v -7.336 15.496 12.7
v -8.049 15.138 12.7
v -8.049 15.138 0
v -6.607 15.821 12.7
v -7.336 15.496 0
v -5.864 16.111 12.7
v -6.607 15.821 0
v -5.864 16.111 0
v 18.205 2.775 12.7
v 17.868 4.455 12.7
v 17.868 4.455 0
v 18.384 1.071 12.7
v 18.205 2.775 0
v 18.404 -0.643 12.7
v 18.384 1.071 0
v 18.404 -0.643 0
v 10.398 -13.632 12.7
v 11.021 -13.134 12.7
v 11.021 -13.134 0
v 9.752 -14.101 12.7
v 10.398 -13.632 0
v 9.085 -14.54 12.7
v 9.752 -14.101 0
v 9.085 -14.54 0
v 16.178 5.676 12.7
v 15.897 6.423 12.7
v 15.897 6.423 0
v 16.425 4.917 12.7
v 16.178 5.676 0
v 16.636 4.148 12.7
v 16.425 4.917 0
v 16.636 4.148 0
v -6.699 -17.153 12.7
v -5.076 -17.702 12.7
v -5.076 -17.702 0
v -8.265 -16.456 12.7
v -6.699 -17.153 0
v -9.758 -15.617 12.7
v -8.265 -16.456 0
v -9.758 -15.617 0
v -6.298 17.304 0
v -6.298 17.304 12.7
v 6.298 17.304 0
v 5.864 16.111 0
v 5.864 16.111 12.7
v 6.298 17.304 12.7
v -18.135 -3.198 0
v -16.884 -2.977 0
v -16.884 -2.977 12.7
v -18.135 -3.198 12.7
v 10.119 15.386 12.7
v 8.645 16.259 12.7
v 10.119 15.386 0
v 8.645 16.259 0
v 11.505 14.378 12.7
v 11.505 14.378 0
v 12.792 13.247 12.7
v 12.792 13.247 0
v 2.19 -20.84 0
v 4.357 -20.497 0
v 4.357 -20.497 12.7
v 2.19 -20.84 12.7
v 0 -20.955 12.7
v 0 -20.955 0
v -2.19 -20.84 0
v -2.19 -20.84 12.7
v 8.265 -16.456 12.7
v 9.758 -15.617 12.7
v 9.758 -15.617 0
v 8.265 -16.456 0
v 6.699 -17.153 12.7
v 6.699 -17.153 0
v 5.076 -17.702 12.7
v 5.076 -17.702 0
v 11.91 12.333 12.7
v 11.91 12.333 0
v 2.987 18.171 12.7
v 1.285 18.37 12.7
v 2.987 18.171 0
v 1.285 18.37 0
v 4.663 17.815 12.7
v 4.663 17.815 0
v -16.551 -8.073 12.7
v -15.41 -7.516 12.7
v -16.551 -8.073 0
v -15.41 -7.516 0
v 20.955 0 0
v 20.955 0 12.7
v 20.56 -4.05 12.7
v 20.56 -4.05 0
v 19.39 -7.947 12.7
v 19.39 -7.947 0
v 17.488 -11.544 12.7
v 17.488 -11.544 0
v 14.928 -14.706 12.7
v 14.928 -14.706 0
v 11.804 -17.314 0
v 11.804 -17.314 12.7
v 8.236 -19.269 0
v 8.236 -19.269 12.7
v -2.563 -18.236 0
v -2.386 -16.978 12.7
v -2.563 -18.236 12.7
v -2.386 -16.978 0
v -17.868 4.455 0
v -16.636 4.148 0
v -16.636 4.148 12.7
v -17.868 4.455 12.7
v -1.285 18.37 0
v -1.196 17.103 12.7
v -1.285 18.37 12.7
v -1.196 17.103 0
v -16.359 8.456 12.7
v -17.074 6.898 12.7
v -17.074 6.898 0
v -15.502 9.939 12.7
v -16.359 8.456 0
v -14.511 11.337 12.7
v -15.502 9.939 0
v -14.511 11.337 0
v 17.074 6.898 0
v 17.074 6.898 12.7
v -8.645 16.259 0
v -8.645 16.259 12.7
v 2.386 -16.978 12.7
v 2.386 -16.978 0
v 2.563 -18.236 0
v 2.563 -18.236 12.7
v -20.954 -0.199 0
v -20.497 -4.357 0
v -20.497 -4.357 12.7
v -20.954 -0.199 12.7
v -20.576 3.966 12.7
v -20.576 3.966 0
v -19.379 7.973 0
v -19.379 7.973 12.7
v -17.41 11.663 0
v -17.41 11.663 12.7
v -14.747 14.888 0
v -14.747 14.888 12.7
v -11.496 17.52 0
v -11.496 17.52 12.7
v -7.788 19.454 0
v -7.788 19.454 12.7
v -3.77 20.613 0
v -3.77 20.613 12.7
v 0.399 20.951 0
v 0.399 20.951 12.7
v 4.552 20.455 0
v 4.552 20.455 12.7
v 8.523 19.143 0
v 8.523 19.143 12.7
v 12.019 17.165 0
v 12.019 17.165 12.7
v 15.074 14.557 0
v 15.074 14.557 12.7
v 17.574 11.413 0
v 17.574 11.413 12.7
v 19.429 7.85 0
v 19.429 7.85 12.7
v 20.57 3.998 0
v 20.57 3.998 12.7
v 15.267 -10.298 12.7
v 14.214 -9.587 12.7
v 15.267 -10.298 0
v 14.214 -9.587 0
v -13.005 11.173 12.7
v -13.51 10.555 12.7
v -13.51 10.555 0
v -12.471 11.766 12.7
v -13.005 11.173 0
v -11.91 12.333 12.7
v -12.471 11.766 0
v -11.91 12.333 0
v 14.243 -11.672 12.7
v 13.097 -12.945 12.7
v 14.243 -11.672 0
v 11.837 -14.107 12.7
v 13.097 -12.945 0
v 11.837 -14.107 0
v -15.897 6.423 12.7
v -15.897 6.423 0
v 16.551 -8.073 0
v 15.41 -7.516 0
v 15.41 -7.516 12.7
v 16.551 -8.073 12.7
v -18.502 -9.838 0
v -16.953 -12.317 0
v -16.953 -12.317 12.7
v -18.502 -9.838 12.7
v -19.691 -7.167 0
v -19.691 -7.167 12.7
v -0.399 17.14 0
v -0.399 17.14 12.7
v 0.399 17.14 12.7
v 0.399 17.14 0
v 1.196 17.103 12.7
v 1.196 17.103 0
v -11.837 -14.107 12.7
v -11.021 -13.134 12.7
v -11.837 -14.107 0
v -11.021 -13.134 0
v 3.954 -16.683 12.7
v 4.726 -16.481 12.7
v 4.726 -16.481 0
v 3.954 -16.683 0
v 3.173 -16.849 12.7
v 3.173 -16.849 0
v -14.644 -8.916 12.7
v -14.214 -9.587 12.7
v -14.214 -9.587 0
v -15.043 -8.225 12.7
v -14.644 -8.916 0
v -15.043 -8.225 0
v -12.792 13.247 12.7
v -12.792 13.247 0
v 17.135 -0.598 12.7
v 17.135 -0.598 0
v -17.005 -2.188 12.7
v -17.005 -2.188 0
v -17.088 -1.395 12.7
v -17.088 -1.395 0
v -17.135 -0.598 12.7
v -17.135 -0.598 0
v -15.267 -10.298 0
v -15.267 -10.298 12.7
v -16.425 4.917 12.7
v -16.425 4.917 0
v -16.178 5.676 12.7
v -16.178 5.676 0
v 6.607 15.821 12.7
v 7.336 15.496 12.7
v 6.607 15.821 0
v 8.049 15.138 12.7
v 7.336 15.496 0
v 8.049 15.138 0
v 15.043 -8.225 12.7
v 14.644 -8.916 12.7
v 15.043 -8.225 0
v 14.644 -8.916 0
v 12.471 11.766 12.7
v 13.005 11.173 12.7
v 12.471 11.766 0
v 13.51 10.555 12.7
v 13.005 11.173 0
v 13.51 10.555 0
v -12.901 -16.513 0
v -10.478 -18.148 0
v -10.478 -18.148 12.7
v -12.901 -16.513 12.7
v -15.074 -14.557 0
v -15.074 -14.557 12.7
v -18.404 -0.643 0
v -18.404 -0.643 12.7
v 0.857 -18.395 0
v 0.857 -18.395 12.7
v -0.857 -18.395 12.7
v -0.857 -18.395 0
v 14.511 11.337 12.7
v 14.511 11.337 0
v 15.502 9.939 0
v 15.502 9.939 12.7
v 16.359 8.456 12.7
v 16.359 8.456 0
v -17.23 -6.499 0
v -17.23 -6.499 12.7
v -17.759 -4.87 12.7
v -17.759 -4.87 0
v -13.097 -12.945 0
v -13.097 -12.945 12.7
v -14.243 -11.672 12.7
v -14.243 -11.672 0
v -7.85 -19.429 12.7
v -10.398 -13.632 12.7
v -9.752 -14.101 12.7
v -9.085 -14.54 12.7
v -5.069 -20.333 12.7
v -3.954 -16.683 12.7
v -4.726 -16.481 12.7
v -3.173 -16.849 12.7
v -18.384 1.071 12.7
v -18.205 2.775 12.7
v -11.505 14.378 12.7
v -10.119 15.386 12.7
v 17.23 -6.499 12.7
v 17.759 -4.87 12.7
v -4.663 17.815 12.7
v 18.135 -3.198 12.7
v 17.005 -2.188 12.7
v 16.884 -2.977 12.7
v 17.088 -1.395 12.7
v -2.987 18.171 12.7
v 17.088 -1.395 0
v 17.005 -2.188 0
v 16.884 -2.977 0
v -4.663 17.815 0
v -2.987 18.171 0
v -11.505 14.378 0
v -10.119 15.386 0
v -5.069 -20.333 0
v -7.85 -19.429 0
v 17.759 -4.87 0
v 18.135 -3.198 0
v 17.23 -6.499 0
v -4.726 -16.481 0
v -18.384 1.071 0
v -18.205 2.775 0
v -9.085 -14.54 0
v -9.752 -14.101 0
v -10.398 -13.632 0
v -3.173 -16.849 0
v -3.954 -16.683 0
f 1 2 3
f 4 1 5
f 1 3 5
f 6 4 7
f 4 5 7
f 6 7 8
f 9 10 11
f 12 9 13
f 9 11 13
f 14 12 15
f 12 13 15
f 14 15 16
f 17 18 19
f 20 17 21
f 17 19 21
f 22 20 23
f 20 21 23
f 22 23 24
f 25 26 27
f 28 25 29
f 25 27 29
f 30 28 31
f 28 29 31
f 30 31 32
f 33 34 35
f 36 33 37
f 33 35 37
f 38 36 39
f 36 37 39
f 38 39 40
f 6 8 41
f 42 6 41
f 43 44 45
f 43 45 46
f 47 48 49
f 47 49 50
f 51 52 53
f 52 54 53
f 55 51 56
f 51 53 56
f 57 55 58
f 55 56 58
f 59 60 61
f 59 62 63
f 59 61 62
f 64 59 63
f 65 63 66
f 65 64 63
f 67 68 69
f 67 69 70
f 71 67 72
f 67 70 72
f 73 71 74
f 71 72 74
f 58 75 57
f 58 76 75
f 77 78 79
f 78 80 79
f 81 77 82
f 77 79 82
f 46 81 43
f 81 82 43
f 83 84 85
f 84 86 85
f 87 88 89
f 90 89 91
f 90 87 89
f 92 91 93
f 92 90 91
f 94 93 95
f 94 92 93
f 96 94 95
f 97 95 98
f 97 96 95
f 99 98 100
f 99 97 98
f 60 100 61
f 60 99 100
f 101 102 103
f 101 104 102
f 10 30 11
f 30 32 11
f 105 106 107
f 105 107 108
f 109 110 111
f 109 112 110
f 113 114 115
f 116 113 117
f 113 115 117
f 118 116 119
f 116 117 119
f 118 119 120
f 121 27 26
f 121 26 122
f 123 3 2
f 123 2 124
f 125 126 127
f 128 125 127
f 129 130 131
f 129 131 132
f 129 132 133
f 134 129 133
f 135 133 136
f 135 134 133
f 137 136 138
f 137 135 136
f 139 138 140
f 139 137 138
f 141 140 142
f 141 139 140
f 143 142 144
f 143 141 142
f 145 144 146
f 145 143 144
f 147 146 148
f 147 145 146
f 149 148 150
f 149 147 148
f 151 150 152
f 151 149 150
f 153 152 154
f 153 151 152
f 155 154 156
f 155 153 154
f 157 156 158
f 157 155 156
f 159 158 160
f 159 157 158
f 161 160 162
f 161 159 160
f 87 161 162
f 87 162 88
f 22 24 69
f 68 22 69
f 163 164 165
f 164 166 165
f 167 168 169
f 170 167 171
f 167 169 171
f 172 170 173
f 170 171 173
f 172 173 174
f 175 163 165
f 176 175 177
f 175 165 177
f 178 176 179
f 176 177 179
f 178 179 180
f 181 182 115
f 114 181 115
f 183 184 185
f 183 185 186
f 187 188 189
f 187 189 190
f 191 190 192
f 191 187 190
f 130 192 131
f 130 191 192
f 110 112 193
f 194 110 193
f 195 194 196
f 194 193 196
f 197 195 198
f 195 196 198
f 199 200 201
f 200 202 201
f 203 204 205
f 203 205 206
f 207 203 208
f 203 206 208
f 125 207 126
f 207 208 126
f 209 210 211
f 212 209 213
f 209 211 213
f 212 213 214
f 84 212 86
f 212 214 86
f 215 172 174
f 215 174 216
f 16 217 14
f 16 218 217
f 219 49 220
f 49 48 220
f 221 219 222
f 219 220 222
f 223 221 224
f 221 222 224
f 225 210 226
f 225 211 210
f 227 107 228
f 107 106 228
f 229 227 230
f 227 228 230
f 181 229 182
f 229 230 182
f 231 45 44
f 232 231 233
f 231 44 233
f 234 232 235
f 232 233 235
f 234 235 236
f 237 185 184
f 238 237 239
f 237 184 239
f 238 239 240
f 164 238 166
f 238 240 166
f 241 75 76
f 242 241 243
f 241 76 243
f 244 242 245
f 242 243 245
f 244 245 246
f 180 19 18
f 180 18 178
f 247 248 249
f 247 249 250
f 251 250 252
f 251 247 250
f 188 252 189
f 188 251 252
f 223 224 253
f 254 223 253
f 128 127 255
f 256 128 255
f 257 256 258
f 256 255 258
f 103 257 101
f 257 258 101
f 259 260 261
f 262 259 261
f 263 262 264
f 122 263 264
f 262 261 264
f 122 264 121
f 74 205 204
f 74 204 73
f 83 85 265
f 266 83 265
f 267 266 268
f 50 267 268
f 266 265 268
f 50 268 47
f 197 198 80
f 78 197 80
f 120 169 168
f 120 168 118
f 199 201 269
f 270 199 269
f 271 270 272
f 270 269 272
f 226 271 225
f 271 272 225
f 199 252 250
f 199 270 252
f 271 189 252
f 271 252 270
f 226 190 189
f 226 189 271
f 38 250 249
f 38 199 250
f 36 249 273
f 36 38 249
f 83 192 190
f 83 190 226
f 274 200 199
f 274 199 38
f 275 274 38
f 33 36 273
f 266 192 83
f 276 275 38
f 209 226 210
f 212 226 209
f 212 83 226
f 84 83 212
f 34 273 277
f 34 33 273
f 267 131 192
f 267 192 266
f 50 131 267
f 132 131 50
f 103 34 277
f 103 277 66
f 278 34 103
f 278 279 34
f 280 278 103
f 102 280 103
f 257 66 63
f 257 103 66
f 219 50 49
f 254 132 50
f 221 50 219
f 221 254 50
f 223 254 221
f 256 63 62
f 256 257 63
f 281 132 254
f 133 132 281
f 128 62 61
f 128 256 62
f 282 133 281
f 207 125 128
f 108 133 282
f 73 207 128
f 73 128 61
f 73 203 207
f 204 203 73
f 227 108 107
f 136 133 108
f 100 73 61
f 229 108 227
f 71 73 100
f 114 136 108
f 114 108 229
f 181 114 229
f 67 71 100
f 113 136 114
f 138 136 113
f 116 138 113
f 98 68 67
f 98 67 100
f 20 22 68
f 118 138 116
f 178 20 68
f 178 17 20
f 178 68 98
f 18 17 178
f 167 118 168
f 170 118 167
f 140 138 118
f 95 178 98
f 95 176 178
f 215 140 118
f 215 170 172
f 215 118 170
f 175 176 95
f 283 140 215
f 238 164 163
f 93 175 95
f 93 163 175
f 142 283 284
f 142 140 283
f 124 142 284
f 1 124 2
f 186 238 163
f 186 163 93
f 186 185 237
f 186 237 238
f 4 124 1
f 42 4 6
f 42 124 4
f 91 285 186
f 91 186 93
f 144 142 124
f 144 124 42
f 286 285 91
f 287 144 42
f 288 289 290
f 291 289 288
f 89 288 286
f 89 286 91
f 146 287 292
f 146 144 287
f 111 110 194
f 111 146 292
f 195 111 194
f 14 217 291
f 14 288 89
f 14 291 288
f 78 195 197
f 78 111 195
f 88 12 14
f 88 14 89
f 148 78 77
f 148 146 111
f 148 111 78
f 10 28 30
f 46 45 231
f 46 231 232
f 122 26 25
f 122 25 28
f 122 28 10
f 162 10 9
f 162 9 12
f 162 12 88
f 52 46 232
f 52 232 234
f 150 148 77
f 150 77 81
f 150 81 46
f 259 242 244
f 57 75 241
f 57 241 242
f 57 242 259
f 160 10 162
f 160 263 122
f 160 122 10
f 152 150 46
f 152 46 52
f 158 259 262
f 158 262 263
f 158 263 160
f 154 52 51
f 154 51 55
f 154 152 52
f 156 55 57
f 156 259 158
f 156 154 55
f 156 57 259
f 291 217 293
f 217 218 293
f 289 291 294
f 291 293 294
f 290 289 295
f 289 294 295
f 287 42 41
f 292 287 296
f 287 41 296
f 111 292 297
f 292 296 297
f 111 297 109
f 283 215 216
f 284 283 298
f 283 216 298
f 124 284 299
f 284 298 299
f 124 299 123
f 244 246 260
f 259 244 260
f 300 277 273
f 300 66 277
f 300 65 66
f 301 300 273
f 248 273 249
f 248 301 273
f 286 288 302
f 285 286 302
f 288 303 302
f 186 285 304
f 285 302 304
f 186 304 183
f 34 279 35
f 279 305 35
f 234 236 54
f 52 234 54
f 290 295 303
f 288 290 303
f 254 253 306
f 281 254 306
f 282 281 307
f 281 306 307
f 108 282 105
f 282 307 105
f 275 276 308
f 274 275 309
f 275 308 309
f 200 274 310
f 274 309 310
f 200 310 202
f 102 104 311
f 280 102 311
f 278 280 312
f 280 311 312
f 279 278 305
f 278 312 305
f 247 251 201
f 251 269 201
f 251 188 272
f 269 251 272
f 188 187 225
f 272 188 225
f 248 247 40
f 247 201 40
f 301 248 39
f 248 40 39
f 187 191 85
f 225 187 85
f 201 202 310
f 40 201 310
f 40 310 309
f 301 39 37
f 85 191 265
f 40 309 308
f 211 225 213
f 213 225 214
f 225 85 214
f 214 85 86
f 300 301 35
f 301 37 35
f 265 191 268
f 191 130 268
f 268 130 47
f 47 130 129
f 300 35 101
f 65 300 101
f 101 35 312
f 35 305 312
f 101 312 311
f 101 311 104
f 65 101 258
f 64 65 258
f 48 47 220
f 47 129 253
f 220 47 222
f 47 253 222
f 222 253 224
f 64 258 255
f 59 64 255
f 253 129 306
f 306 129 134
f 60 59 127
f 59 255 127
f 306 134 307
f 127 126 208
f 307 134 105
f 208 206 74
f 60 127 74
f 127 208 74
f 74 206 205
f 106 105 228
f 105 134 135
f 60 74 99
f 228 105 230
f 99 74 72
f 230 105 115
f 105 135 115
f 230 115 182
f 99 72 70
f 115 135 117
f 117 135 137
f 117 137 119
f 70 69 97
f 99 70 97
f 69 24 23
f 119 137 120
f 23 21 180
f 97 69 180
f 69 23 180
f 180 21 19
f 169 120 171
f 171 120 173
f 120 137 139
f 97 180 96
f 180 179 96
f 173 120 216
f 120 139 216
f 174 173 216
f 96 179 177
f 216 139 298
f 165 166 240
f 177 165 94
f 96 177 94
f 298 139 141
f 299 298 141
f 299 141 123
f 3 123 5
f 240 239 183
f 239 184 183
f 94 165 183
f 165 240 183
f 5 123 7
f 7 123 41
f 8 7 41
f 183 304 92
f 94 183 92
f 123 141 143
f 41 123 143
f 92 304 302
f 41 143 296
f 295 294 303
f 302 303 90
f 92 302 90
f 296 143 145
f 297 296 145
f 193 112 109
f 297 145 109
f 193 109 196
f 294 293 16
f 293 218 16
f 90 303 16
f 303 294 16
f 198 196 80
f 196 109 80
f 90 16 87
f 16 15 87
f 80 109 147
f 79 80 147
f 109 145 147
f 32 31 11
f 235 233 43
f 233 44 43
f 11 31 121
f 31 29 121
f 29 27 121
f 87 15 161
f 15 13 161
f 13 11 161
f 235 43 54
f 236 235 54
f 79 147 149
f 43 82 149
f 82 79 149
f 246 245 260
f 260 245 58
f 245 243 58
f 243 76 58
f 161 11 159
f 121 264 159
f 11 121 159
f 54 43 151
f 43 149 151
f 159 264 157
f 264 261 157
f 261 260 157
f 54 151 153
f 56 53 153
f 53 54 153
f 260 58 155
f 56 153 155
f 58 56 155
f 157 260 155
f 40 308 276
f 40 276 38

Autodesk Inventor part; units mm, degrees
ref_plane "YZ Plane" through (0, 0, 0) normal (1, 0, 0) x (0, 1, 0)
ref_plane "XZ Plane" through (0, 0, 0) normal (0, 1, 0) x (-1, 0, 0)
ref_plane "XY Plane" through (0, 0, 0) normal (0, 0, 1) x (1, 0, 0)
sketch "Sketch1" plane through (0, 0, 0) normal (0, 0, 1) x (1, 0, 0)
  circle A0 centre (0, 0) radius 20.955
  circle A1 centre (0, 0) radius 18.415
  arc A2 (1.196, 17.1032) -> (-1.196, 17.1032) centre (0, 0) ccw
  line L0 (0, 0) -> (0, 27.5348)
  line L1 (1.196, 17.1032) -> (1.2846, 18.3701)
  line L2 (-1.196, 17.1032) -> (-1.2846, 18.3701)
  dimension "d0" = 41.91
  dimension "d2" = 1.27
  dimension "d3" = 2.54
extrude "Extrusion1" add sketch "Sketch1" along normal blind 12.7
extrude "Extrusion2" add sketch "Sketch1" along normal blind 12.7 contours A1 L1 A2 L0 | L0 A2 L2 A1
pattern_circular "Circular Pattern1" count 15 over 360 about axis through (0, 0, 0) along (0, 0, 1) of "Extrusion2", "Extrusion1"
properties part number "AWAutomobloxTire"
